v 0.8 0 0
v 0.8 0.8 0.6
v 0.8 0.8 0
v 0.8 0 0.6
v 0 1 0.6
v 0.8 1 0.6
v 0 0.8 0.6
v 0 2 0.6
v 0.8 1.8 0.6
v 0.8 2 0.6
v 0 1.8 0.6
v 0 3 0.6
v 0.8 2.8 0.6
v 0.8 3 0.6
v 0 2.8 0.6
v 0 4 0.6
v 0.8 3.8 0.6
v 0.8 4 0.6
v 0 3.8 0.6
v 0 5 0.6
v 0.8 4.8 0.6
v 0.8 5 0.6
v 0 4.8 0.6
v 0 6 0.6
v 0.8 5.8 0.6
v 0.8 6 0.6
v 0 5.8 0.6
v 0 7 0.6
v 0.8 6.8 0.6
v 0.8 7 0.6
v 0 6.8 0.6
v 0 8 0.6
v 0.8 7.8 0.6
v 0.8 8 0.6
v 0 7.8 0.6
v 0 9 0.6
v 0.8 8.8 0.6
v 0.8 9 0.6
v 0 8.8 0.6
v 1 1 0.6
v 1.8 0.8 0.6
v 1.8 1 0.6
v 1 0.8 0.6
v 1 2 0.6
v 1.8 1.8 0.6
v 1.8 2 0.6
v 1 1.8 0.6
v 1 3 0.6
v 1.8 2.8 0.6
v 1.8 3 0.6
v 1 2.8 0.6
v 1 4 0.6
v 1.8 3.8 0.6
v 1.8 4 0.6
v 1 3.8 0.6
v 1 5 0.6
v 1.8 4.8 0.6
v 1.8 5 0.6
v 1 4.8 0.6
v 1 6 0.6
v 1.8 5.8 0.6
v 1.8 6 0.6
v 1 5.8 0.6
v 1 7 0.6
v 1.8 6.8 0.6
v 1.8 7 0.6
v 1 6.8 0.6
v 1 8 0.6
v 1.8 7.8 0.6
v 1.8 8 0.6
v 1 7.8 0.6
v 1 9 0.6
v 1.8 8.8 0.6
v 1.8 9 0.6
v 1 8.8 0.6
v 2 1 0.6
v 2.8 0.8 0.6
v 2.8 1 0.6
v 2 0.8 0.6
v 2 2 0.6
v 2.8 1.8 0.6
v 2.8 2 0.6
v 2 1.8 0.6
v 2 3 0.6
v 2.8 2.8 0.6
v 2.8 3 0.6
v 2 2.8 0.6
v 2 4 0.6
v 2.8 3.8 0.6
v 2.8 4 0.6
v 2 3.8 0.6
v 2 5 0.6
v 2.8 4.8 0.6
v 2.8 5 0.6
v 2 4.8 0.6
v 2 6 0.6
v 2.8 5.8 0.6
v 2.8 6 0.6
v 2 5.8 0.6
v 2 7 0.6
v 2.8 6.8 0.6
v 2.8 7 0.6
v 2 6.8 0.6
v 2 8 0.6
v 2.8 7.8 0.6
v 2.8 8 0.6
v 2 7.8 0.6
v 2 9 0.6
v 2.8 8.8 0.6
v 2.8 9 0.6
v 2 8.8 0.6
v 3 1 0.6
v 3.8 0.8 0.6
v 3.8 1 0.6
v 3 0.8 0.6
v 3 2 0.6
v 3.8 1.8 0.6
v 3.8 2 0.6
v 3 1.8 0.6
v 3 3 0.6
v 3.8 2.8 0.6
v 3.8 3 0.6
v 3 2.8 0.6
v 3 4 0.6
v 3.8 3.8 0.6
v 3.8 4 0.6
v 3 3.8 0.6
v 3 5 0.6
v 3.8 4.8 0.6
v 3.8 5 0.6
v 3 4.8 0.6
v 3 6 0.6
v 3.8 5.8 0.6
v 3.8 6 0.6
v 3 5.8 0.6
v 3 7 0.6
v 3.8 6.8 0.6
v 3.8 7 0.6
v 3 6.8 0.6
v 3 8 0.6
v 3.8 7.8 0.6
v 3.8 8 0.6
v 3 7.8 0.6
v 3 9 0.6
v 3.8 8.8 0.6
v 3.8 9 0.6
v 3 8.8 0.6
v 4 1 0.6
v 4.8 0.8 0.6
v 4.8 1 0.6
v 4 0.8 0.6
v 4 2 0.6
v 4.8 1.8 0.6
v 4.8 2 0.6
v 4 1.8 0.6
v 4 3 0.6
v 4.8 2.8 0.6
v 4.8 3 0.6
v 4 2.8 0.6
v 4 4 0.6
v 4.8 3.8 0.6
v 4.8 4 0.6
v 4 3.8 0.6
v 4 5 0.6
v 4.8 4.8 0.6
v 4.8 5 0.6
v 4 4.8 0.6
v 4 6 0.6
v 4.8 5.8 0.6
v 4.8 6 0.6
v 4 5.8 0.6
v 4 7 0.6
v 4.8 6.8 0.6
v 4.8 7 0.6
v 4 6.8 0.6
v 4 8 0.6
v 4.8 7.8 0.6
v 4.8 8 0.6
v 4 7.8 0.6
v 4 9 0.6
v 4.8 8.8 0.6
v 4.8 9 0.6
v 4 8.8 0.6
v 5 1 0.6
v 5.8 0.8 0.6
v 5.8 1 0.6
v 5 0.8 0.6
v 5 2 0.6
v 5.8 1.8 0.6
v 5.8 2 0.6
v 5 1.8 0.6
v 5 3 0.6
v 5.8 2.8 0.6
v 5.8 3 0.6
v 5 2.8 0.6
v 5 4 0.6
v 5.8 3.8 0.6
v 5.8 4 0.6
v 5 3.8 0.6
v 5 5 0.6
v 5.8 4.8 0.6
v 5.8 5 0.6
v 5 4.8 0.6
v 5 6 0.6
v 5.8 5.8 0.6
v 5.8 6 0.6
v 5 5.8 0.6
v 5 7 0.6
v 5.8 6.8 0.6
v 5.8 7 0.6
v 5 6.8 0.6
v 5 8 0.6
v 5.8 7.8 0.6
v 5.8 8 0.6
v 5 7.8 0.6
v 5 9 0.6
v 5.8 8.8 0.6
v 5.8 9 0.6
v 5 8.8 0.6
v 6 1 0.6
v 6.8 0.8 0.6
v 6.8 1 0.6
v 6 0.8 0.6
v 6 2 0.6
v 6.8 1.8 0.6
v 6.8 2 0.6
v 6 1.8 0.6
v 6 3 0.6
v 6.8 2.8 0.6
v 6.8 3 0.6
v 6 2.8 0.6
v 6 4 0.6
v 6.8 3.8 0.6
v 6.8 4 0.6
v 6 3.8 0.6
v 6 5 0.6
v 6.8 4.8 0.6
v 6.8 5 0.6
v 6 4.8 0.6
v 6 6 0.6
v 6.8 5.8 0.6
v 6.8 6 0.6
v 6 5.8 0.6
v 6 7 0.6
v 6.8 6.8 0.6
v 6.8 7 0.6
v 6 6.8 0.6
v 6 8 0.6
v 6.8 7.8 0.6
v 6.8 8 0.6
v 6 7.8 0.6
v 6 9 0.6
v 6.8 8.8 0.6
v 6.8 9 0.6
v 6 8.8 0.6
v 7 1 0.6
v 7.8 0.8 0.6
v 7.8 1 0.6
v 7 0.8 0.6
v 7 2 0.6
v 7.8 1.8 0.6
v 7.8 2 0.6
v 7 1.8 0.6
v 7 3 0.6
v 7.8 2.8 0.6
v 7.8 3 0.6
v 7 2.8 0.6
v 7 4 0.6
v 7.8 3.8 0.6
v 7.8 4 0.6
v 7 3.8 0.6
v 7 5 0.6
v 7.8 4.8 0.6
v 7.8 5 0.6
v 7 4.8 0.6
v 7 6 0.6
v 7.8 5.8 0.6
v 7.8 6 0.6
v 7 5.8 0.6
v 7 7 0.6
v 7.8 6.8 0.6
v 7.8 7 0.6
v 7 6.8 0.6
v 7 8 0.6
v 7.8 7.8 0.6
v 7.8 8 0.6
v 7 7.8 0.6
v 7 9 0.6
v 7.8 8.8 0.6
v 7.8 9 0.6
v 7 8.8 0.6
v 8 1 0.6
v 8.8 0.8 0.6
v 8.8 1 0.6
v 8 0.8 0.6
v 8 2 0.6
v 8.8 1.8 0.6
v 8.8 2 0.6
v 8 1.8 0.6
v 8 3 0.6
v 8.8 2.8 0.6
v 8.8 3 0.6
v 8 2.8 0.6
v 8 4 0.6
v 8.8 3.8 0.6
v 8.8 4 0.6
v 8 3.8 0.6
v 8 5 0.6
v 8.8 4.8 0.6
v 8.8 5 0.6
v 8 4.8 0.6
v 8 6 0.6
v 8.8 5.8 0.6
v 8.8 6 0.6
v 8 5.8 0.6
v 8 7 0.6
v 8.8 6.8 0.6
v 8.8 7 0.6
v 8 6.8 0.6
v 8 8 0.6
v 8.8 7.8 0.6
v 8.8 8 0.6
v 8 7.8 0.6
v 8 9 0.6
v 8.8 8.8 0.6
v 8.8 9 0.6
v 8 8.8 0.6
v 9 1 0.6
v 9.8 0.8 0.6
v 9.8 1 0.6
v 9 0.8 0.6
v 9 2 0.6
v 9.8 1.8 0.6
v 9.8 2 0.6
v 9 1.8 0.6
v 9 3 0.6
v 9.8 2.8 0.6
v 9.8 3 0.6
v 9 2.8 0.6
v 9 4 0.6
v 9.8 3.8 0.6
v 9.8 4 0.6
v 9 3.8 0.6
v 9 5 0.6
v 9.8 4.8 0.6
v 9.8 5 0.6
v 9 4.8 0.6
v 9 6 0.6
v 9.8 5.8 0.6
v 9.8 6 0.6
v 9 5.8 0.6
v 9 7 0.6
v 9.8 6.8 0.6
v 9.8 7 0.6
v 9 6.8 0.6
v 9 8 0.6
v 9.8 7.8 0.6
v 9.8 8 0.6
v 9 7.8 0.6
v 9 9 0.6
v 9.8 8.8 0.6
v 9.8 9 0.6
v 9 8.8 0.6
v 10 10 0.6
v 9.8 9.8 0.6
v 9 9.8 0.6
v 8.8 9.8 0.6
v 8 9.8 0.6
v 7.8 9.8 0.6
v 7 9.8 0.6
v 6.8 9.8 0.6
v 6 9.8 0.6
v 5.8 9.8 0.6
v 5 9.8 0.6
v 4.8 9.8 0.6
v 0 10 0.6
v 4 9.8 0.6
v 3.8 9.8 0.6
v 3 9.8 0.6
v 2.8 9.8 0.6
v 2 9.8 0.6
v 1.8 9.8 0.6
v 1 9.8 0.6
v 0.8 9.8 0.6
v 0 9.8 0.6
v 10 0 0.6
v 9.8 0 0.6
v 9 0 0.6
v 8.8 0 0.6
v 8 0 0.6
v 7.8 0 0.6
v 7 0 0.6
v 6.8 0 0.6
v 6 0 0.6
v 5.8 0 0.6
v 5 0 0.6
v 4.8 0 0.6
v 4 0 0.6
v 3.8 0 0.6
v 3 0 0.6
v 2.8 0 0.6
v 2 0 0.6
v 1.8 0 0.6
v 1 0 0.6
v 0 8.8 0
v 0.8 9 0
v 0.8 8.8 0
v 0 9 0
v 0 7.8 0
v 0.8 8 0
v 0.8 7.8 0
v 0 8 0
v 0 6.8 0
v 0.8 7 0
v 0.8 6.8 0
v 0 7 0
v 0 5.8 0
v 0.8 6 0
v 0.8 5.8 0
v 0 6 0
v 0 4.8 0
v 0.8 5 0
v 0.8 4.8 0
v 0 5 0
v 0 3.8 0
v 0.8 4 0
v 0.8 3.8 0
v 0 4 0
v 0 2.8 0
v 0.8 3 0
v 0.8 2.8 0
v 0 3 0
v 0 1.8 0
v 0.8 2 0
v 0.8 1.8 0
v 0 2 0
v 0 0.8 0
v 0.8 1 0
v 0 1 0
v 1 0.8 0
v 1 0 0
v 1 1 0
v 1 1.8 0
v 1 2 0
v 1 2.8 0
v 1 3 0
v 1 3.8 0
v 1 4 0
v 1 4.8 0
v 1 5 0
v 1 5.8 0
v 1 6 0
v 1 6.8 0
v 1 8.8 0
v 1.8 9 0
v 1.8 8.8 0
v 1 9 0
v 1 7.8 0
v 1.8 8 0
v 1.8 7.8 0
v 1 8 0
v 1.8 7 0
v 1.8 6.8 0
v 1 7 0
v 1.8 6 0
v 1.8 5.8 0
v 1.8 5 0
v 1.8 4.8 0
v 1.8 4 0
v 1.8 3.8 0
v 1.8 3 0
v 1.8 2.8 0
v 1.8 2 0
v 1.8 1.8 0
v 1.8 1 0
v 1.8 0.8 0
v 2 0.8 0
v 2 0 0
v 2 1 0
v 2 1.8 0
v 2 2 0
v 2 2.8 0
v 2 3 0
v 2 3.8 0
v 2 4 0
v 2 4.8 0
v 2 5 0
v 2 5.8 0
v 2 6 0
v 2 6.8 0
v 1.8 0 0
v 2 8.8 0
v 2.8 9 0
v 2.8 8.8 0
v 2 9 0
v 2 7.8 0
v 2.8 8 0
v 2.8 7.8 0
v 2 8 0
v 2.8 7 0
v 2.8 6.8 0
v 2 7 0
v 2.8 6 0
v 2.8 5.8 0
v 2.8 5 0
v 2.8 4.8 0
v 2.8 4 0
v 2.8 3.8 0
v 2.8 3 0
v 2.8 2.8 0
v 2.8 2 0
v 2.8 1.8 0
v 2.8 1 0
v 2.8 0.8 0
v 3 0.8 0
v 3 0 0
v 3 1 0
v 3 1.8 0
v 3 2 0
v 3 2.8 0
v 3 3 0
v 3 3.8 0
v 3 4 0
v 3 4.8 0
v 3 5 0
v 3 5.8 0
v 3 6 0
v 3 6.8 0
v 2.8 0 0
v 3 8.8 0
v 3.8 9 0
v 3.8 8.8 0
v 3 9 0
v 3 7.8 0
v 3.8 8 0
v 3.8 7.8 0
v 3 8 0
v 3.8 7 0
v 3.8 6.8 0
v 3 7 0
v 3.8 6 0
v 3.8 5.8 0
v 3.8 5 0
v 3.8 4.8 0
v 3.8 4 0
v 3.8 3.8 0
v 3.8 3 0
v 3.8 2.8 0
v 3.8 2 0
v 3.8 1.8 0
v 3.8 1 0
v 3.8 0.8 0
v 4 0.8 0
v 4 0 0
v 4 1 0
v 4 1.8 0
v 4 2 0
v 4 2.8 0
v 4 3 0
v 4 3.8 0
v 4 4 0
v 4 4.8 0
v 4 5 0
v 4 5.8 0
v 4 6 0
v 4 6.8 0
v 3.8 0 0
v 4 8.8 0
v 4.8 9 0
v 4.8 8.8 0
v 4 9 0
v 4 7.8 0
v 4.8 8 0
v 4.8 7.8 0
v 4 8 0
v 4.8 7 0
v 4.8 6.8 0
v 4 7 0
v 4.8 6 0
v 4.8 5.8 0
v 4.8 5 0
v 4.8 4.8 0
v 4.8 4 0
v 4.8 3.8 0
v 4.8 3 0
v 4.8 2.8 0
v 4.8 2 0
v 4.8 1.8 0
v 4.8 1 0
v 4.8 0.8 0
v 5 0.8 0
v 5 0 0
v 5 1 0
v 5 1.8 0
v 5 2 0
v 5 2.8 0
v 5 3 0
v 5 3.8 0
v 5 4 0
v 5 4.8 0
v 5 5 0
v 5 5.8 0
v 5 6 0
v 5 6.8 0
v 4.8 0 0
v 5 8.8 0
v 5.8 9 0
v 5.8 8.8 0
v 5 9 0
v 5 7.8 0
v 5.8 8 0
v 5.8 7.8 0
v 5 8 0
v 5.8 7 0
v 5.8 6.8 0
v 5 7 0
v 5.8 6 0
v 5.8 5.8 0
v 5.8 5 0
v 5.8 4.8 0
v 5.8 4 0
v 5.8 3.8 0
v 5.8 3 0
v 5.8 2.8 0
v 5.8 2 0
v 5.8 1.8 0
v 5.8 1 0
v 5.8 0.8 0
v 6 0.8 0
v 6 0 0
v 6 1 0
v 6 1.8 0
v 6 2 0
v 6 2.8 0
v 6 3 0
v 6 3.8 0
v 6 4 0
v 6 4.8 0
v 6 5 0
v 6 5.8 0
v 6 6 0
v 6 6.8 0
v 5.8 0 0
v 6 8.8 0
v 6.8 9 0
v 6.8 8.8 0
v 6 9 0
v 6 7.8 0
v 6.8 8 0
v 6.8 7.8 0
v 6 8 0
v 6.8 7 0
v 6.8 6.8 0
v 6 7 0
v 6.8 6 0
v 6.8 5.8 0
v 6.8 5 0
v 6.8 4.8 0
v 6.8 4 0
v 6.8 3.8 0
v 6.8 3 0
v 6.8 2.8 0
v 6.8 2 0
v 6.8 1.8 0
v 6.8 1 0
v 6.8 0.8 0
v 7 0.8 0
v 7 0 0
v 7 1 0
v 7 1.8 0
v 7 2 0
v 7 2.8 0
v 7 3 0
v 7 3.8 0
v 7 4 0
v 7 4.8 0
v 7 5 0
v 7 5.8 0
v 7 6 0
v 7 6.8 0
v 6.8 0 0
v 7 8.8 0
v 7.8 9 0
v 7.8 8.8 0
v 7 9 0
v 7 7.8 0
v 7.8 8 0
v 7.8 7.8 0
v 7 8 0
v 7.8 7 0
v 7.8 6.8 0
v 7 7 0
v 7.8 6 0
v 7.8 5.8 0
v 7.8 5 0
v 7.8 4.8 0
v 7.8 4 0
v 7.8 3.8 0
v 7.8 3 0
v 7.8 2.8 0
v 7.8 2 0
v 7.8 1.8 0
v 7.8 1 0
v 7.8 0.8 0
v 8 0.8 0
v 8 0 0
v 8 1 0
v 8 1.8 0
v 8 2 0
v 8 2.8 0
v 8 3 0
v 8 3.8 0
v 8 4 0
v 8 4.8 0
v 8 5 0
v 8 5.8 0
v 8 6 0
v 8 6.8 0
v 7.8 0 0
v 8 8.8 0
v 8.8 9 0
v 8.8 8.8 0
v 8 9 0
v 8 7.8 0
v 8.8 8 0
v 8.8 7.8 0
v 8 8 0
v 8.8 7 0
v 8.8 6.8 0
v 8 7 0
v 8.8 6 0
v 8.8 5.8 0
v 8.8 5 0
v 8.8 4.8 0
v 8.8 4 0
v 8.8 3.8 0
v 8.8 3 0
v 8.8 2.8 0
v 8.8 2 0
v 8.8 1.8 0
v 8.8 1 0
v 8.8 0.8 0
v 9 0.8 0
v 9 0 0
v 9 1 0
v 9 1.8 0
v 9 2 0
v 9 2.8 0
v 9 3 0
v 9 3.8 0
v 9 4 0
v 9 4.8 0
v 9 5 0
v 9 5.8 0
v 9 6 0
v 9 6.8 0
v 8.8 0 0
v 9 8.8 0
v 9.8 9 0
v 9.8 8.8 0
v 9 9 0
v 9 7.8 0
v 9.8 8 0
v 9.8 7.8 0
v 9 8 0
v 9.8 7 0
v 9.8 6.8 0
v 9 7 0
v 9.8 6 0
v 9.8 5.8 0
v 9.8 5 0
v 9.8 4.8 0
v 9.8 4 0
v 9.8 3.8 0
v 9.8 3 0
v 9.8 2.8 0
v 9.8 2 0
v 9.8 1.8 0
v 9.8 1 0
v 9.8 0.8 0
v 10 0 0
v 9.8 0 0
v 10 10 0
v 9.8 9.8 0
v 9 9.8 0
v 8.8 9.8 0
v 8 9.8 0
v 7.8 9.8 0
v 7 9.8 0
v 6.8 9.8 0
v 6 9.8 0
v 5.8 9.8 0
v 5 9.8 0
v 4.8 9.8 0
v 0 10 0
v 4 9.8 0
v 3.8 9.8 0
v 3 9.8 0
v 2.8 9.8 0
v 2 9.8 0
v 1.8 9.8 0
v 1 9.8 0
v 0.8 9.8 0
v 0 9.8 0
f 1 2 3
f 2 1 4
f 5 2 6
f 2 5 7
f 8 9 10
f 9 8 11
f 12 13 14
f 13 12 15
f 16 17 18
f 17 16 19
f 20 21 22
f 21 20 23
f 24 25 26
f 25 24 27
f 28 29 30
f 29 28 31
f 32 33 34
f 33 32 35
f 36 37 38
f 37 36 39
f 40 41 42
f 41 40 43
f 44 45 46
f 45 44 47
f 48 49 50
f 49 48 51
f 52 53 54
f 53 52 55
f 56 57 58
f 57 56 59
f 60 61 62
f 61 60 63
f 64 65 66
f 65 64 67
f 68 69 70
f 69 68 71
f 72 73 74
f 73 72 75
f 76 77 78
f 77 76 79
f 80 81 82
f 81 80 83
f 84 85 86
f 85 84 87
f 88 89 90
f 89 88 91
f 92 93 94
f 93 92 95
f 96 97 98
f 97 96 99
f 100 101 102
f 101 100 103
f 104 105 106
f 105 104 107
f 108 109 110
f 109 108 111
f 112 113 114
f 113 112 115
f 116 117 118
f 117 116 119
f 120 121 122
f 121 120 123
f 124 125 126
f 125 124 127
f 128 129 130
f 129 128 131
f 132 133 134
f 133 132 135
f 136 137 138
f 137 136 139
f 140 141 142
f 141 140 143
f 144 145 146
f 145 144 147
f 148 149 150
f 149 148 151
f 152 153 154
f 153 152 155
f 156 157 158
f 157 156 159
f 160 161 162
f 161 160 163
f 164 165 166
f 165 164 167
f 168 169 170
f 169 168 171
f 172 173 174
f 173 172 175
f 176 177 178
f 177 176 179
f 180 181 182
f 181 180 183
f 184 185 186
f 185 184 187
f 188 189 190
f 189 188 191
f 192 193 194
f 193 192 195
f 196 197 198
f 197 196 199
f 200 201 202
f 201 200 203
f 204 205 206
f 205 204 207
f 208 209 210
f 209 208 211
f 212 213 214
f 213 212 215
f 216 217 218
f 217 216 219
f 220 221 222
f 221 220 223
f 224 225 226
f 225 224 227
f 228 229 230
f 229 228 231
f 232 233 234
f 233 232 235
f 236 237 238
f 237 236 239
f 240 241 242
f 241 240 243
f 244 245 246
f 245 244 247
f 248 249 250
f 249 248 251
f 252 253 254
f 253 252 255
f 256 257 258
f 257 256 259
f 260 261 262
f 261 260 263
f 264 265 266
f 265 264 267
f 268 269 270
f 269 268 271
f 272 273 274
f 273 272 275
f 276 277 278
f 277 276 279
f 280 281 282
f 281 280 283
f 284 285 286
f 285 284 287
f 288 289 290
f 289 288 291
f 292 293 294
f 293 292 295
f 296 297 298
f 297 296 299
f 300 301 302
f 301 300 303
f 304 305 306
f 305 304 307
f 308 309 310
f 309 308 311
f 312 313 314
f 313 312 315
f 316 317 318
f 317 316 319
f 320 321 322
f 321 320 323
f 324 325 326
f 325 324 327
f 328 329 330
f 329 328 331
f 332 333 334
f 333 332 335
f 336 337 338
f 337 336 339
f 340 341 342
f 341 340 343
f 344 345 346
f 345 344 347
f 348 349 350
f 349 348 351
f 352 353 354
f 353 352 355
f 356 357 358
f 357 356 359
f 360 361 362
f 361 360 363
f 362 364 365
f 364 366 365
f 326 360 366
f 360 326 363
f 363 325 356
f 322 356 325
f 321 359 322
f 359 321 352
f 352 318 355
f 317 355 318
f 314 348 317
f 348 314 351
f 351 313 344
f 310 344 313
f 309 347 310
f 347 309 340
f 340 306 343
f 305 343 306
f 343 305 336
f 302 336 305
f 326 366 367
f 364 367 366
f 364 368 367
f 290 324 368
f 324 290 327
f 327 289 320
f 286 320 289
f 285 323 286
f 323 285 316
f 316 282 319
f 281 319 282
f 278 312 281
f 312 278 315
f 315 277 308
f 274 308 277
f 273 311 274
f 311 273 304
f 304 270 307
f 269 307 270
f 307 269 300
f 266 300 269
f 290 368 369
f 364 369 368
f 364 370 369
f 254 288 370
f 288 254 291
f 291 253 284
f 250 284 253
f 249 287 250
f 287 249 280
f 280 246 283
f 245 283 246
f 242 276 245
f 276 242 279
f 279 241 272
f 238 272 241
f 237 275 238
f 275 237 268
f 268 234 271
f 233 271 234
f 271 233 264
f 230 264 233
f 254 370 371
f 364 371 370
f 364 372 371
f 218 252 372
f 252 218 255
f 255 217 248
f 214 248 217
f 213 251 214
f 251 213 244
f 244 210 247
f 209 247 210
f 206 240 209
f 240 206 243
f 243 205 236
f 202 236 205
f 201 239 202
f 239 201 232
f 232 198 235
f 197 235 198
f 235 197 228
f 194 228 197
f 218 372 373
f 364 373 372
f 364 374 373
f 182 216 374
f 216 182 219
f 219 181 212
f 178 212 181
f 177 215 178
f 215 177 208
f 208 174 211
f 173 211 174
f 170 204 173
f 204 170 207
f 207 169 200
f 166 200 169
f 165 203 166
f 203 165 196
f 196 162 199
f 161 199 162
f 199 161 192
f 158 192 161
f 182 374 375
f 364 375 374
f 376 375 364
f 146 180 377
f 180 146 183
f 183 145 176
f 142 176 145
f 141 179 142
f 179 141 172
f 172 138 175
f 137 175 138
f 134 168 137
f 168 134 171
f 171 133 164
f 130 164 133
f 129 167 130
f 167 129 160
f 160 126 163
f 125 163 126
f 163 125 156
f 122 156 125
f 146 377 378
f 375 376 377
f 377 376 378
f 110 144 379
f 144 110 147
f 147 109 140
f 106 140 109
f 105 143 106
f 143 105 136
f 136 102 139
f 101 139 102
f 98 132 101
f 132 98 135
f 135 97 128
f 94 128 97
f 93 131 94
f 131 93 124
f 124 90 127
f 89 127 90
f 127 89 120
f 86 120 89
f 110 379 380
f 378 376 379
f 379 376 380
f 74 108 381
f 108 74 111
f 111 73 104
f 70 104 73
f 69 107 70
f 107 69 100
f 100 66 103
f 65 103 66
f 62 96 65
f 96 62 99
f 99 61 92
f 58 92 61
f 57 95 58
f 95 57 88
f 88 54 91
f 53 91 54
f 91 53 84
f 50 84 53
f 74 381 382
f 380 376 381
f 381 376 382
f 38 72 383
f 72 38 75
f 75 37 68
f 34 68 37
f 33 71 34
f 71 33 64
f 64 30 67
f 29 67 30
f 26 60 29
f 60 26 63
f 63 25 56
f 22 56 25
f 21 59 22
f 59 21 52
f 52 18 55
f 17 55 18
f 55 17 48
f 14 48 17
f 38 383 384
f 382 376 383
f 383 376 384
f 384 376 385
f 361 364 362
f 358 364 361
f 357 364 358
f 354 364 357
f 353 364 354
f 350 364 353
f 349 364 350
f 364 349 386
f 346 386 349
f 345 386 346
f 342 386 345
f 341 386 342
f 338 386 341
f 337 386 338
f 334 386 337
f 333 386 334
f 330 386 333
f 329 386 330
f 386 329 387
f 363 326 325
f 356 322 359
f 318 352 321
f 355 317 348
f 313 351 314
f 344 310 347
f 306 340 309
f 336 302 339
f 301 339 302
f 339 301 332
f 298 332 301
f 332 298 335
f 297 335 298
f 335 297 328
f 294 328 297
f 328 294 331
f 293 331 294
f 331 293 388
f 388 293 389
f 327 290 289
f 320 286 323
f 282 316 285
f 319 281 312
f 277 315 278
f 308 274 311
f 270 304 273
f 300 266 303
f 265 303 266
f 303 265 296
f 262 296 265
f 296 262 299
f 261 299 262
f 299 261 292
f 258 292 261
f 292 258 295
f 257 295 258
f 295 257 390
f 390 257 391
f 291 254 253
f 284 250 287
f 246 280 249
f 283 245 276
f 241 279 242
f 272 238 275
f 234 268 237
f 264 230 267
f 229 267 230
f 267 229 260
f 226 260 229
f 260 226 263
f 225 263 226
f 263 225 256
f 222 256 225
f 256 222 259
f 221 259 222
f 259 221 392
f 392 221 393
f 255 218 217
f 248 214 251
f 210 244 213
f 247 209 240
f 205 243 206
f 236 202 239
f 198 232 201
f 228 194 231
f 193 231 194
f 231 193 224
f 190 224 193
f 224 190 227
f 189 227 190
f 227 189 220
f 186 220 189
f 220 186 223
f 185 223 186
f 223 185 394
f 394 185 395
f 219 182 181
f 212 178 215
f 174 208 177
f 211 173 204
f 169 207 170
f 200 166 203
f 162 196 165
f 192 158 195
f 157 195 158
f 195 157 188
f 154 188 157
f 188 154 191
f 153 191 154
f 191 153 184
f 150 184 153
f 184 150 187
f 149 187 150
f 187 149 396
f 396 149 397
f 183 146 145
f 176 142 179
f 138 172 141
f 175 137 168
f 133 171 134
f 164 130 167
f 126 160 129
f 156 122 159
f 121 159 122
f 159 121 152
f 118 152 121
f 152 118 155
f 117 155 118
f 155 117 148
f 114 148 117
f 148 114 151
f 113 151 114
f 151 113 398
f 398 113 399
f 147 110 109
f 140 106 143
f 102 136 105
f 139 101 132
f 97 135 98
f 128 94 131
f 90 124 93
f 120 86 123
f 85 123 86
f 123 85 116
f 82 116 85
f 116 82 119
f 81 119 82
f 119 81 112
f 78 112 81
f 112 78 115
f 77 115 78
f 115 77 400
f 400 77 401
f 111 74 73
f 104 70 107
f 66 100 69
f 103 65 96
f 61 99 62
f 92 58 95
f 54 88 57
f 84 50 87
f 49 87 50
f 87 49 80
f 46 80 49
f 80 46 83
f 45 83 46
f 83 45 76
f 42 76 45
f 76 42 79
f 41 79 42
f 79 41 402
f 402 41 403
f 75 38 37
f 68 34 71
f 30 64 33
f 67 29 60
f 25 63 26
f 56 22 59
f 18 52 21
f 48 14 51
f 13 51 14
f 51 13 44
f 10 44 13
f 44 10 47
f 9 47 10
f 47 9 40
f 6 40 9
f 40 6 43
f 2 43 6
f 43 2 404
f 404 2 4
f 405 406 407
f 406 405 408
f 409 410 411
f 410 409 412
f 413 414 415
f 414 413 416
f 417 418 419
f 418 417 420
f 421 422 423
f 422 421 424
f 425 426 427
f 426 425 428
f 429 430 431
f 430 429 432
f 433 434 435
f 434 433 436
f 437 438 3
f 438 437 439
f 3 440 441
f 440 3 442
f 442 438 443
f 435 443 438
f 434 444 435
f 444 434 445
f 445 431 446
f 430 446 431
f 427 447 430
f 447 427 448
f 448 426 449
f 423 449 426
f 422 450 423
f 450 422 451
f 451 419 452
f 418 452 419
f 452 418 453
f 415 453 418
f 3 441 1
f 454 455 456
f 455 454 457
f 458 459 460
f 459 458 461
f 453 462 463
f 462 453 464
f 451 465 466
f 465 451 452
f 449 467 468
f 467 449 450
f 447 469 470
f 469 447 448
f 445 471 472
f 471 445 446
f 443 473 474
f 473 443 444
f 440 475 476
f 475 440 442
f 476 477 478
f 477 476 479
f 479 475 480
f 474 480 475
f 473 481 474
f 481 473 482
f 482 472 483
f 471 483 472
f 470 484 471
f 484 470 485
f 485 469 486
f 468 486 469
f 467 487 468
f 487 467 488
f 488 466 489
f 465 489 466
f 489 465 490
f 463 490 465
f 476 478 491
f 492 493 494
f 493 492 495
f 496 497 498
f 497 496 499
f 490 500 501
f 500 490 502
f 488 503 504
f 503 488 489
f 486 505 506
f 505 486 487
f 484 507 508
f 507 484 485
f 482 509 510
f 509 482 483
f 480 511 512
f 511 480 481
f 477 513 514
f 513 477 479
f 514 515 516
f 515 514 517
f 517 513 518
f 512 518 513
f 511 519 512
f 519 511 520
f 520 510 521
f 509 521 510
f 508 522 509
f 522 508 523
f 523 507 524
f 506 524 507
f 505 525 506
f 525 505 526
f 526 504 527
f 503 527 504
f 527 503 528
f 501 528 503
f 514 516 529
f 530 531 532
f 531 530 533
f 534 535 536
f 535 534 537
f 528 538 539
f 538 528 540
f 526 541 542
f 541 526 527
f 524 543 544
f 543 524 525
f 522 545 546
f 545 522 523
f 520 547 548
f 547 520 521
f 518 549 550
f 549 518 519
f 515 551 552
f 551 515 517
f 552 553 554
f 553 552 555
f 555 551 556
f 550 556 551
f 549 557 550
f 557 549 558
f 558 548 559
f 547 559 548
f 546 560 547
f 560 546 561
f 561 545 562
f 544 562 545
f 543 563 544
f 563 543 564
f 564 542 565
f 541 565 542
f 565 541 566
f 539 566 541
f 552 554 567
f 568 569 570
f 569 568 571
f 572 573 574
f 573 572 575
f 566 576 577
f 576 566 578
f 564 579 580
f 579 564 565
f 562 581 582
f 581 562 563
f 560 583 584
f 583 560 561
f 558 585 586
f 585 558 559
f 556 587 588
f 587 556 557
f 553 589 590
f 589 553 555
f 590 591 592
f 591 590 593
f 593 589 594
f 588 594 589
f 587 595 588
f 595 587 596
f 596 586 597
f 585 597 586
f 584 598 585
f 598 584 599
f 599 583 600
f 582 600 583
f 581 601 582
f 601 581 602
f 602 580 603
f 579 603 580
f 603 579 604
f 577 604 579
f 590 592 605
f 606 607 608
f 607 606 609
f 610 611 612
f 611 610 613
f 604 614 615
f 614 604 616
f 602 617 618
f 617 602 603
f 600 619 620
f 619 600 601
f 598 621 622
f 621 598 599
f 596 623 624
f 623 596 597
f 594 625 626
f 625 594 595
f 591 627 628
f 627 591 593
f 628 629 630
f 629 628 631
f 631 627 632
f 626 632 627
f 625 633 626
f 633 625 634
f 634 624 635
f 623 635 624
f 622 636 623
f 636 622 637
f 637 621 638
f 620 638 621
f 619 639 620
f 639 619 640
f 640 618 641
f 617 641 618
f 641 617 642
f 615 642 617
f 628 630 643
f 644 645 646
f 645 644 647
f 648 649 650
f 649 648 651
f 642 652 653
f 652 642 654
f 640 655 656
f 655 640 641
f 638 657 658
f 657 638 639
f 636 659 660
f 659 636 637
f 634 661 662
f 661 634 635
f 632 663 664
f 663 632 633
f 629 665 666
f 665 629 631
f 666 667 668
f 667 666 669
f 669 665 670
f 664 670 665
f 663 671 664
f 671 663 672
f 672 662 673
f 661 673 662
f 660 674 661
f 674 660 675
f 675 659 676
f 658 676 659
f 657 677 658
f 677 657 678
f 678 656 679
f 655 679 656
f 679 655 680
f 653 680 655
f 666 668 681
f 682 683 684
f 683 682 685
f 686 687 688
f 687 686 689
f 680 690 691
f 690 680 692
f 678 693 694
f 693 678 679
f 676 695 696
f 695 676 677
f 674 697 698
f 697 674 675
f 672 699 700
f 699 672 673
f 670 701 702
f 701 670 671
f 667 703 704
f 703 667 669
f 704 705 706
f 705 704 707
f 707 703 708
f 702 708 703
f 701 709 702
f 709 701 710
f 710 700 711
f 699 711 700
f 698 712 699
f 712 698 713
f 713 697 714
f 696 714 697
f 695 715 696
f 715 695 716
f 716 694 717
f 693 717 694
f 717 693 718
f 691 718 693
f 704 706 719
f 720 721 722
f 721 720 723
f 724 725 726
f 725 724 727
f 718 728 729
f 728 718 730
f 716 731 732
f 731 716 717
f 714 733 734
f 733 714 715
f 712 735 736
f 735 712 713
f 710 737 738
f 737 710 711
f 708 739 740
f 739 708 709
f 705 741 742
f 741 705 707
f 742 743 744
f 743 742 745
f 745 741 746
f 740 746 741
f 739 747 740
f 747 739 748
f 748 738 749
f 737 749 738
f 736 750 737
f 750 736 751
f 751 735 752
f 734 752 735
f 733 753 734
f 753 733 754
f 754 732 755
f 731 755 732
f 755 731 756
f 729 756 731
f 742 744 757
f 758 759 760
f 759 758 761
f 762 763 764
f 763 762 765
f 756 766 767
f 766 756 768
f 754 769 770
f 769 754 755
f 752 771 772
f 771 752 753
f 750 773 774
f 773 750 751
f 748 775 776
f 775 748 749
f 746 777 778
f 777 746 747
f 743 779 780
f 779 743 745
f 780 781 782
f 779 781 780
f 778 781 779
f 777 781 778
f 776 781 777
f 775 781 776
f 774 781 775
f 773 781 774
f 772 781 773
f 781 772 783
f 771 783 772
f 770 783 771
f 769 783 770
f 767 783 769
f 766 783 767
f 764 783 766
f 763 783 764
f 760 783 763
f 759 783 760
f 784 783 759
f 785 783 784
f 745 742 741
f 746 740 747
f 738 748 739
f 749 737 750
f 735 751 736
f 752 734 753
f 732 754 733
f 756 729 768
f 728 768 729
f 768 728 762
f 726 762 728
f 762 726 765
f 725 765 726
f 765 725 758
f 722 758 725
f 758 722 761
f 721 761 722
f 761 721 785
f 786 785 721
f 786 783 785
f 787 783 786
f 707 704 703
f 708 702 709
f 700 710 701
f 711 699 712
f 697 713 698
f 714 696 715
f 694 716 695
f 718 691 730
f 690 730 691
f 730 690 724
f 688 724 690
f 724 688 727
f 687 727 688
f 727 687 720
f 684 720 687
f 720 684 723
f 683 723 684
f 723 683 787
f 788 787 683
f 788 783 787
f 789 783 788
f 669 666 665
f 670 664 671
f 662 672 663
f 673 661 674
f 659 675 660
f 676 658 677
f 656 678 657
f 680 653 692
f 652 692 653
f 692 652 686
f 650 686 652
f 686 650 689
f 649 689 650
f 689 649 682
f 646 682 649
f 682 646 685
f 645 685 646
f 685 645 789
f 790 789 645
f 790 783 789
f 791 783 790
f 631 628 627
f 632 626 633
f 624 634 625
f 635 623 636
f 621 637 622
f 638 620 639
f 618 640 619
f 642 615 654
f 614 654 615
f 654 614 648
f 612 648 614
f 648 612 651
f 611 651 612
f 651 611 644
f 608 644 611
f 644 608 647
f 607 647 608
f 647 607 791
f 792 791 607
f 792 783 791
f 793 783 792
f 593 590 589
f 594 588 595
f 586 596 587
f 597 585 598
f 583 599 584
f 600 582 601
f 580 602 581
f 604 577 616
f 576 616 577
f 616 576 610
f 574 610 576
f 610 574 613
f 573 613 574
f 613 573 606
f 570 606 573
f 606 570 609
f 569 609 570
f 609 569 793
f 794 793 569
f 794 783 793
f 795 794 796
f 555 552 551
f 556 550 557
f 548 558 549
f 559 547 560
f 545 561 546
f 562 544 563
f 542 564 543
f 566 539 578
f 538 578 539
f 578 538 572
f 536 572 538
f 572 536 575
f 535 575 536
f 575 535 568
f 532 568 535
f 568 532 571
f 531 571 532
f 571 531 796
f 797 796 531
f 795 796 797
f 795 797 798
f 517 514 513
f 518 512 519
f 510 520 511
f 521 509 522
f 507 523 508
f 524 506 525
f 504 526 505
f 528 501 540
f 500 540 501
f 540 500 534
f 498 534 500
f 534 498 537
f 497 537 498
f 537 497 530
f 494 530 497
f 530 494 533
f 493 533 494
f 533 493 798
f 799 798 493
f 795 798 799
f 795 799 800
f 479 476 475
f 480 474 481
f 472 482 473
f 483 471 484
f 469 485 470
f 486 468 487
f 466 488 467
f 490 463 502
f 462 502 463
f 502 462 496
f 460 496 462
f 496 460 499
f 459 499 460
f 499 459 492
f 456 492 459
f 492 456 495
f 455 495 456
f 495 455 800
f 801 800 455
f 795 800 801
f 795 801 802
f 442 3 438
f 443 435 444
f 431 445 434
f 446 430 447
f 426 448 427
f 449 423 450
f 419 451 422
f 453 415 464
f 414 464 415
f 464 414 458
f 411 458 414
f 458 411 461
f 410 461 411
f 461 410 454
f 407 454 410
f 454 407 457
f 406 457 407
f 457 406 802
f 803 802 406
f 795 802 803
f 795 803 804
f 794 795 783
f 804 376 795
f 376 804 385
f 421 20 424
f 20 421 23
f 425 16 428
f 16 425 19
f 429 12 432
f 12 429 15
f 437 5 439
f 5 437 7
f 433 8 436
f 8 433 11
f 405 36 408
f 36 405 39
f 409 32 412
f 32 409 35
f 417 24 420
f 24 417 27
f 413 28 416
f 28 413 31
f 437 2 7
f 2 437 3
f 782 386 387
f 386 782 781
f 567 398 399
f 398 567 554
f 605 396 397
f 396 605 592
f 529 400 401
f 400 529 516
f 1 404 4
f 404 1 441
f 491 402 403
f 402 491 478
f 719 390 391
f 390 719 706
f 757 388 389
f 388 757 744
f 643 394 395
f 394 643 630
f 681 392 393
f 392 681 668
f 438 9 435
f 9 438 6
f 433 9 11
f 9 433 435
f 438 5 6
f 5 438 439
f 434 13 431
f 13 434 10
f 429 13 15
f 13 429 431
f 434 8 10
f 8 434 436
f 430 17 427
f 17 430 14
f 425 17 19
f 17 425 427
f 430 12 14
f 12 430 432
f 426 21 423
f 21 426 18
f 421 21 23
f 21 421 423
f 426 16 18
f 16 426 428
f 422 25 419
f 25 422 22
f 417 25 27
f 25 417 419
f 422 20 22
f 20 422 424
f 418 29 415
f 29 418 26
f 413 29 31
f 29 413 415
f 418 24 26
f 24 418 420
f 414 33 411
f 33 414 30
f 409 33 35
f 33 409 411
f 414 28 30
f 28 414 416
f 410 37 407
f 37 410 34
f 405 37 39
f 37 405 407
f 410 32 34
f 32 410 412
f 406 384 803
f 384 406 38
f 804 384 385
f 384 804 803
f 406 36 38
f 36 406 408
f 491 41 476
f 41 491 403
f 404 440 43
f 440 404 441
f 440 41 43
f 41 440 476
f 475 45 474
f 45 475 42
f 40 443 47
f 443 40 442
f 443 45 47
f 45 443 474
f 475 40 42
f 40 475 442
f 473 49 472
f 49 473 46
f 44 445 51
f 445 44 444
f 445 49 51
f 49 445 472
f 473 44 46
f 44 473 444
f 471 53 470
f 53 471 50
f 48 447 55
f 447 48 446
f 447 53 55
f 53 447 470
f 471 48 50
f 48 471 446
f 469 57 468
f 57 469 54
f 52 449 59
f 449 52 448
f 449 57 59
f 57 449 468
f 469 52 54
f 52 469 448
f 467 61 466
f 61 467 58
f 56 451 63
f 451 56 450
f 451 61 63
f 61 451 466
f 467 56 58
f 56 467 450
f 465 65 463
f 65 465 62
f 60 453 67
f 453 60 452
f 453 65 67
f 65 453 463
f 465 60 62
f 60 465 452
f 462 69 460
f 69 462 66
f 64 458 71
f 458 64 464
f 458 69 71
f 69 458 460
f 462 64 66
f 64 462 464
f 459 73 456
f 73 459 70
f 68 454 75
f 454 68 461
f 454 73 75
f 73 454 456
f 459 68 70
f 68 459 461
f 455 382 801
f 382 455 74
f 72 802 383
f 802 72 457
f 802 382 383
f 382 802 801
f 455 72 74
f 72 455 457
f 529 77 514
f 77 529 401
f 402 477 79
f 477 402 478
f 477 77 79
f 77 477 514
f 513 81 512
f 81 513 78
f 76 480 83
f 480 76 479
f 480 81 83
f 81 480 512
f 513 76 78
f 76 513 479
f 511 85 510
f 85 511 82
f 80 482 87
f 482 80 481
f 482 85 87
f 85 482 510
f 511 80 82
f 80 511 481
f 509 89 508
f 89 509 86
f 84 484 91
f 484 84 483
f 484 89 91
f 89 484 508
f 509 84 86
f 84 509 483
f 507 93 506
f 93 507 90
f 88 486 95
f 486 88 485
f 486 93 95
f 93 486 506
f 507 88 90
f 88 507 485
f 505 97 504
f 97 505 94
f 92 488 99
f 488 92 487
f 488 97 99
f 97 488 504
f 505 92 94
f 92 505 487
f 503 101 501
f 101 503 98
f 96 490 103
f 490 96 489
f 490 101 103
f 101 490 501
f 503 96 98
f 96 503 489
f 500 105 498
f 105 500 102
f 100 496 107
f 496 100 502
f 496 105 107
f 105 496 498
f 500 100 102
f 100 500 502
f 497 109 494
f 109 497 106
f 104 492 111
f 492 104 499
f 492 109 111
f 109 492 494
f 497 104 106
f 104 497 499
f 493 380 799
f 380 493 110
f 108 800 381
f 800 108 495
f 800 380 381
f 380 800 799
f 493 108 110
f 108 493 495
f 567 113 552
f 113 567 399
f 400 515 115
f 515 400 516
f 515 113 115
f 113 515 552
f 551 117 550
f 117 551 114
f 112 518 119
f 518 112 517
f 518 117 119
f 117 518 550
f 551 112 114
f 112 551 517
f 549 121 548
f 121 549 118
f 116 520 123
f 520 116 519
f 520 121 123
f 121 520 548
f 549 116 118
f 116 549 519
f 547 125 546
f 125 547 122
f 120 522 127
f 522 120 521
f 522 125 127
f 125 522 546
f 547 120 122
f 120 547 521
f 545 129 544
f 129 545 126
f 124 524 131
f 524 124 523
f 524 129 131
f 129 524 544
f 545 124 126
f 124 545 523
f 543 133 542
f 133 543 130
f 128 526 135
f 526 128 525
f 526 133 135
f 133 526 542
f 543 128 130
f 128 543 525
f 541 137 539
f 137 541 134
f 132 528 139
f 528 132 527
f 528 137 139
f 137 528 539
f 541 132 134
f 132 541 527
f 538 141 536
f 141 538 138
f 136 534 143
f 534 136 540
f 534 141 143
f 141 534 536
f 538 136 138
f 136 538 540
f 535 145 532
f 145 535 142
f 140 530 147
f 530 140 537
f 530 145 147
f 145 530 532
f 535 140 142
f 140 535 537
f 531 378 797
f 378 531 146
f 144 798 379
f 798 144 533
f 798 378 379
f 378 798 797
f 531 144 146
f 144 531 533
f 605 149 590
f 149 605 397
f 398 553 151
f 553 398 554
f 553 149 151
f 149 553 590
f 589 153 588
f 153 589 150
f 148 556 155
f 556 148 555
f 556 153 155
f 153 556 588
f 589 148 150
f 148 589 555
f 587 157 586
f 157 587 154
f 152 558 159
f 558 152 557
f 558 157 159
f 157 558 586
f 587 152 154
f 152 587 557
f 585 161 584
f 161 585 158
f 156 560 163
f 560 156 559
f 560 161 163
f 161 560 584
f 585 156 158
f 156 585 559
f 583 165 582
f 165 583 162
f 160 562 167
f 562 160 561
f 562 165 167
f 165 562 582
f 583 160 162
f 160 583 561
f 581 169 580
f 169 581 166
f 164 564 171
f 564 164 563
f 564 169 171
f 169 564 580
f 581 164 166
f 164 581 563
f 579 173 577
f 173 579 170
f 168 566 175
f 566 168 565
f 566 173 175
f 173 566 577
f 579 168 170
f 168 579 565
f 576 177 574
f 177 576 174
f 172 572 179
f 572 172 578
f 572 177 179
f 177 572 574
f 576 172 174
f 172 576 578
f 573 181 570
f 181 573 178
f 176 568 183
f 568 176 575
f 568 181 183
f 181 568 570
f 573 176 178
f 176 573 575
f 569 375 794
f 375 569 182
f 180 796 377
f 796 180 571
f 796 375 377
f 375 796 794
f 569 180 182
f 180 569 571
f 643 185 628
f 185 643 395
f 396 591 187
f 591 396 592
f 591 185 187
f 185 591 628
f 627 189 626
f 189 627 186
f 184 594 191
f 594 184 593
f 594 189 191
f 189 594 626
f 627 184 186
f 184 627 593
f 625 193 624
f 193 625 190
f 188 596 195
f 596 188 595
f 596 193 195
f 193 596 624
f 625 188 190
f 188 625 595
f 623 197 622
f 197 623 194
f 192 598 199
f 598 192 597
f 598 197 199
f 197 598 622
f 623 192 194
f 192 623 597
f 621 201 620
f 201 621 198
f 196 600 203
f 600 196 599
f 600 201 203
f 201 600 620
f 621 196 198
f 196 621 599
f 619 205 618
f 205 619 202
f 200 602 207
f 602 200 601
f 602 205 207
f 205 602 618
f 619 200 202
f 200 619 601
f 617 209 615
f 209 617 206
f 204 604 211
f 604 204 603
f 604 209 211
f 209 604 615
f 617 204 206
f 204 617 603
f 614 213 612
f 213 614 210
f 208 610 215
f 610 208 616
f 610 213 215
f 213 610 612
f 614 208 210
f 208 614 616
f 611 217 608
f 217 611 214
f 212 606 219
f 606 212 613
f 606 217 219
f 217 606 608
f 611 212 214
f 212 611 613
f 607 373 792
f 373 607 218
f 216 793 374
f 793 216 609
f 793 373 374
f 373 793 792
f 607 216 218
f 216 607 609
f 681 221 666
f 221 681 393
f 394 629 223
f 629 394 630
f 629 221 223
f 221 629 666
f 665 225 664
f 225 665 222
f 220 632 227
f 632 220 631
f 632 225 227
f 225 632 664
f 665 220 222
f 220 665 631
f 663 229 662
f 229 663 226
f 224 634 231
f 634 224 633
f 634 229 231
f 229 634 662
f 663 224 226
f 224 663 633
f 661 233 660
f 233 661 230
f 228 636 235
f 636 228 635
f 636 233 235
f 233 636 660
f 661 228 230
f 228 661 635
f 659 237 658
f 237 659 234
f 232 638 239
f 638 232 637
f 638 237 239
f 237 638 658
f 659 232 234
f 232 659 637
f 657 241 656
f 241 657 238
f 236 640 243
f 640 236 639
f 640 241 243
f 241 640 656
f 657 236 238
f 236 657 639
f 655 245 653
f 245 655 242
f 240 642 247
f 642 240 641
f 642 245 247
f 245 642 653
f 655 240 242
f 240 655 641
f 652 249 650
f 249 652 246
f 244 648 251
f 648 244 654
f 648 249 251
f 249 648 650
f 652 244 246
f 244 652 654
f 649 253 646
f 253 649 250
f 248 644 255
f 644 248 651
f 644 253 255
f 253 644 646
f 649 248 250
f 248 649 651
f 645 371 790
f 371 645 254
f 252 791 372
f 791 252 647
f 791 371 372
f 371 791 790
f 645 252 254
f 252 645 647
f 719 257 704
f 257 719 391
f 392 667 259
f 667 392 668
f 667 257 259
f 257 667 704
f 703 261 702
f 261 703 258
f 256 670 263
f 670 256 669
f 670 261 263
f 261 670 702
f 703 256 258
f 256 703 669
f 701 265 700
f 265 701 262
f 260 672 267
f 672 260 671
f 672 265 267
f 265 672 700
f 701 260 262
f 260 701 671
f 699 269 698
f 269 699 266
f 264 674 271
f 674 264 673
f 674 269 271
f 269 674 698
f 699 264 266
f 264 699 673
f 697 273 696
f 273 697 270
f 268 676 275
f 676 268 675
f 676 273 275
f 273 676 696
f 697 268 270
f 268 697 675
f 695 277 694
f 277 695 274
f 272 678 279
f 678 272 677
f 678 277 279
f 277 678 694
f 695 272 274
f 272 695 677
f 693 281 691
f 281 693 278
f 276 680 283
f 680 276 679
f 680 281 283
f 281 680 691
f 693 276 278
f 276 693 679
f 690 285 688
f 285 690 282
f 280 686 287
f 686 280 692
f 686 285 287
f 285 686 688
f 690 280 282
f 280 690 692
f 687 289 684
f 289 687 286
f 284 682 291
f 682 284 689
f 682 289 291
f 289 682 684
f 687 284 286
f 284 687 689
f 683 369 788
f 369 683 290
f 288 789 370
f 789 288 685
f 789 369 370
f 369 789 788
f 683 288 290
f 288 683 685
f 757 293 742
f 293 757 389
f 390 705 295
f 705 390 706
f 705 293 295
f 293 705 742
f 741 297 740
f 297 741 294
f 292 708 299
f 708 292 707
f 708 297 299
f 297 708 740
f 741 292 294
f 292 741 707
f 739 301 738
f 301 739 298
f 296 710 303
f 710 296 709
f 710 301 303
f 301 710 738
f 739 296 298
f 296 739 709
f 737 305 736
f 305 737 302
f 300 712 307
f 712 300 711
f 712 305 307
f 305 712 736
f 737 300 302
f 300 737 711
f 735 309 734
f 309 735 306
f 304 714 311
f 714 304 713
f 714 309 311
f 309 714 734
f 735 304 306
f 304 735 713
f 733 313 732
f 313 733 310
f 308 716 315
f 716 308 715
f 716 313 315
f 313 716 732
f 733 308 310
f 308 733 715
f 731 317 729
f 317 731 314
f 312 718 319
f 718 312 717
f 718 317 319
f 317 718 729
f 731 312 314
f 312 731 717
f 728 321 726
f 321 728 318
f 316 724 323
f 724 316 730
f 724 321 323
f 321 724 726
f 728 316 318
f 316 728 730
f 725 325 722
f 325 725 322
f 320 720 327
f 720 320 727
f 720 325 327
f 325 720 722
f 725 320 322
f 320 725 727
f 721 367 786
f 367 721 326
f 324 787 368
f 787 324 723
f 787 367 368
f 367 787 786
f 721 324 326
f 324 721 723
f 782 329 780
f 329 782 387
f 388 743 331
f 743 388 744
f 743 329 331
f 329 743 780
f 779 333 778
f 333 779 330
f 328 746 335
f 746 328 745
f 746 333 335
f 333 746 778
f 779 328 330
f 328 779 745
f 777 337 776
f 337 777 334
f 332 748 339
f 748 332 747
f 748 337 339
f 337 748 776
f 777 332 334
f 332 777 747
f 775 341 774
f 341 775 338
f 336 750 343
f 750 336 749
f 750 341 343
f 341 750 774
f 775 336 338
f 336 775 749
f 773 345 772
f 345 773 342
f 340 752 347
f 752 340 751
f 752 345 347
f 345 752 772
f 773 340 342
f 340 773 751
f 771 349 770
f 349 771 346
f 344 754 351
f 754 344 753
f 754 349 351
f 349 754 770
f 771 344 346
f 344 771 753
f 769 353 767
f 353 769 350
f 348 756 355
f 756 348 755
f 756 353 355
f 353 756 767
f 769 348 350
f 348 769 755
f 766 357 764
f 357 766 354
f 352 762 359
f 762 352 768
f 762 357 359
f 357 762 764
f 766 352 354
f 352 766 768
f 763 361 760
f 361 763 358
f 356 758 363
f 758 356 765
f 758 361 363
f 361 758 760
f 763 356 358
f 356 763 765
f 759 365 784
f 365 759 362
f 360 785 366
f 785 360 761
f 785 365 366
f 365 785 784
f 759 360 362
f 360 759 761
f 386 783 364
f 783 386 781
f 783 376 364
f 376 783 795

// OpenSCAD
wi = 10;
de = 10;
he = 0.6;
hole_wi = 0.8;
hole_de = 0.8;

difference(){
    cube([wi, de, he]);
    for(i = [0 : 1 : (wi-1)]){
        for(j = [0 : 1 : (de-1)]){
            translate([i, j, 0]) cube([hole_wi, hole_de, he]);
        }
    }
}
